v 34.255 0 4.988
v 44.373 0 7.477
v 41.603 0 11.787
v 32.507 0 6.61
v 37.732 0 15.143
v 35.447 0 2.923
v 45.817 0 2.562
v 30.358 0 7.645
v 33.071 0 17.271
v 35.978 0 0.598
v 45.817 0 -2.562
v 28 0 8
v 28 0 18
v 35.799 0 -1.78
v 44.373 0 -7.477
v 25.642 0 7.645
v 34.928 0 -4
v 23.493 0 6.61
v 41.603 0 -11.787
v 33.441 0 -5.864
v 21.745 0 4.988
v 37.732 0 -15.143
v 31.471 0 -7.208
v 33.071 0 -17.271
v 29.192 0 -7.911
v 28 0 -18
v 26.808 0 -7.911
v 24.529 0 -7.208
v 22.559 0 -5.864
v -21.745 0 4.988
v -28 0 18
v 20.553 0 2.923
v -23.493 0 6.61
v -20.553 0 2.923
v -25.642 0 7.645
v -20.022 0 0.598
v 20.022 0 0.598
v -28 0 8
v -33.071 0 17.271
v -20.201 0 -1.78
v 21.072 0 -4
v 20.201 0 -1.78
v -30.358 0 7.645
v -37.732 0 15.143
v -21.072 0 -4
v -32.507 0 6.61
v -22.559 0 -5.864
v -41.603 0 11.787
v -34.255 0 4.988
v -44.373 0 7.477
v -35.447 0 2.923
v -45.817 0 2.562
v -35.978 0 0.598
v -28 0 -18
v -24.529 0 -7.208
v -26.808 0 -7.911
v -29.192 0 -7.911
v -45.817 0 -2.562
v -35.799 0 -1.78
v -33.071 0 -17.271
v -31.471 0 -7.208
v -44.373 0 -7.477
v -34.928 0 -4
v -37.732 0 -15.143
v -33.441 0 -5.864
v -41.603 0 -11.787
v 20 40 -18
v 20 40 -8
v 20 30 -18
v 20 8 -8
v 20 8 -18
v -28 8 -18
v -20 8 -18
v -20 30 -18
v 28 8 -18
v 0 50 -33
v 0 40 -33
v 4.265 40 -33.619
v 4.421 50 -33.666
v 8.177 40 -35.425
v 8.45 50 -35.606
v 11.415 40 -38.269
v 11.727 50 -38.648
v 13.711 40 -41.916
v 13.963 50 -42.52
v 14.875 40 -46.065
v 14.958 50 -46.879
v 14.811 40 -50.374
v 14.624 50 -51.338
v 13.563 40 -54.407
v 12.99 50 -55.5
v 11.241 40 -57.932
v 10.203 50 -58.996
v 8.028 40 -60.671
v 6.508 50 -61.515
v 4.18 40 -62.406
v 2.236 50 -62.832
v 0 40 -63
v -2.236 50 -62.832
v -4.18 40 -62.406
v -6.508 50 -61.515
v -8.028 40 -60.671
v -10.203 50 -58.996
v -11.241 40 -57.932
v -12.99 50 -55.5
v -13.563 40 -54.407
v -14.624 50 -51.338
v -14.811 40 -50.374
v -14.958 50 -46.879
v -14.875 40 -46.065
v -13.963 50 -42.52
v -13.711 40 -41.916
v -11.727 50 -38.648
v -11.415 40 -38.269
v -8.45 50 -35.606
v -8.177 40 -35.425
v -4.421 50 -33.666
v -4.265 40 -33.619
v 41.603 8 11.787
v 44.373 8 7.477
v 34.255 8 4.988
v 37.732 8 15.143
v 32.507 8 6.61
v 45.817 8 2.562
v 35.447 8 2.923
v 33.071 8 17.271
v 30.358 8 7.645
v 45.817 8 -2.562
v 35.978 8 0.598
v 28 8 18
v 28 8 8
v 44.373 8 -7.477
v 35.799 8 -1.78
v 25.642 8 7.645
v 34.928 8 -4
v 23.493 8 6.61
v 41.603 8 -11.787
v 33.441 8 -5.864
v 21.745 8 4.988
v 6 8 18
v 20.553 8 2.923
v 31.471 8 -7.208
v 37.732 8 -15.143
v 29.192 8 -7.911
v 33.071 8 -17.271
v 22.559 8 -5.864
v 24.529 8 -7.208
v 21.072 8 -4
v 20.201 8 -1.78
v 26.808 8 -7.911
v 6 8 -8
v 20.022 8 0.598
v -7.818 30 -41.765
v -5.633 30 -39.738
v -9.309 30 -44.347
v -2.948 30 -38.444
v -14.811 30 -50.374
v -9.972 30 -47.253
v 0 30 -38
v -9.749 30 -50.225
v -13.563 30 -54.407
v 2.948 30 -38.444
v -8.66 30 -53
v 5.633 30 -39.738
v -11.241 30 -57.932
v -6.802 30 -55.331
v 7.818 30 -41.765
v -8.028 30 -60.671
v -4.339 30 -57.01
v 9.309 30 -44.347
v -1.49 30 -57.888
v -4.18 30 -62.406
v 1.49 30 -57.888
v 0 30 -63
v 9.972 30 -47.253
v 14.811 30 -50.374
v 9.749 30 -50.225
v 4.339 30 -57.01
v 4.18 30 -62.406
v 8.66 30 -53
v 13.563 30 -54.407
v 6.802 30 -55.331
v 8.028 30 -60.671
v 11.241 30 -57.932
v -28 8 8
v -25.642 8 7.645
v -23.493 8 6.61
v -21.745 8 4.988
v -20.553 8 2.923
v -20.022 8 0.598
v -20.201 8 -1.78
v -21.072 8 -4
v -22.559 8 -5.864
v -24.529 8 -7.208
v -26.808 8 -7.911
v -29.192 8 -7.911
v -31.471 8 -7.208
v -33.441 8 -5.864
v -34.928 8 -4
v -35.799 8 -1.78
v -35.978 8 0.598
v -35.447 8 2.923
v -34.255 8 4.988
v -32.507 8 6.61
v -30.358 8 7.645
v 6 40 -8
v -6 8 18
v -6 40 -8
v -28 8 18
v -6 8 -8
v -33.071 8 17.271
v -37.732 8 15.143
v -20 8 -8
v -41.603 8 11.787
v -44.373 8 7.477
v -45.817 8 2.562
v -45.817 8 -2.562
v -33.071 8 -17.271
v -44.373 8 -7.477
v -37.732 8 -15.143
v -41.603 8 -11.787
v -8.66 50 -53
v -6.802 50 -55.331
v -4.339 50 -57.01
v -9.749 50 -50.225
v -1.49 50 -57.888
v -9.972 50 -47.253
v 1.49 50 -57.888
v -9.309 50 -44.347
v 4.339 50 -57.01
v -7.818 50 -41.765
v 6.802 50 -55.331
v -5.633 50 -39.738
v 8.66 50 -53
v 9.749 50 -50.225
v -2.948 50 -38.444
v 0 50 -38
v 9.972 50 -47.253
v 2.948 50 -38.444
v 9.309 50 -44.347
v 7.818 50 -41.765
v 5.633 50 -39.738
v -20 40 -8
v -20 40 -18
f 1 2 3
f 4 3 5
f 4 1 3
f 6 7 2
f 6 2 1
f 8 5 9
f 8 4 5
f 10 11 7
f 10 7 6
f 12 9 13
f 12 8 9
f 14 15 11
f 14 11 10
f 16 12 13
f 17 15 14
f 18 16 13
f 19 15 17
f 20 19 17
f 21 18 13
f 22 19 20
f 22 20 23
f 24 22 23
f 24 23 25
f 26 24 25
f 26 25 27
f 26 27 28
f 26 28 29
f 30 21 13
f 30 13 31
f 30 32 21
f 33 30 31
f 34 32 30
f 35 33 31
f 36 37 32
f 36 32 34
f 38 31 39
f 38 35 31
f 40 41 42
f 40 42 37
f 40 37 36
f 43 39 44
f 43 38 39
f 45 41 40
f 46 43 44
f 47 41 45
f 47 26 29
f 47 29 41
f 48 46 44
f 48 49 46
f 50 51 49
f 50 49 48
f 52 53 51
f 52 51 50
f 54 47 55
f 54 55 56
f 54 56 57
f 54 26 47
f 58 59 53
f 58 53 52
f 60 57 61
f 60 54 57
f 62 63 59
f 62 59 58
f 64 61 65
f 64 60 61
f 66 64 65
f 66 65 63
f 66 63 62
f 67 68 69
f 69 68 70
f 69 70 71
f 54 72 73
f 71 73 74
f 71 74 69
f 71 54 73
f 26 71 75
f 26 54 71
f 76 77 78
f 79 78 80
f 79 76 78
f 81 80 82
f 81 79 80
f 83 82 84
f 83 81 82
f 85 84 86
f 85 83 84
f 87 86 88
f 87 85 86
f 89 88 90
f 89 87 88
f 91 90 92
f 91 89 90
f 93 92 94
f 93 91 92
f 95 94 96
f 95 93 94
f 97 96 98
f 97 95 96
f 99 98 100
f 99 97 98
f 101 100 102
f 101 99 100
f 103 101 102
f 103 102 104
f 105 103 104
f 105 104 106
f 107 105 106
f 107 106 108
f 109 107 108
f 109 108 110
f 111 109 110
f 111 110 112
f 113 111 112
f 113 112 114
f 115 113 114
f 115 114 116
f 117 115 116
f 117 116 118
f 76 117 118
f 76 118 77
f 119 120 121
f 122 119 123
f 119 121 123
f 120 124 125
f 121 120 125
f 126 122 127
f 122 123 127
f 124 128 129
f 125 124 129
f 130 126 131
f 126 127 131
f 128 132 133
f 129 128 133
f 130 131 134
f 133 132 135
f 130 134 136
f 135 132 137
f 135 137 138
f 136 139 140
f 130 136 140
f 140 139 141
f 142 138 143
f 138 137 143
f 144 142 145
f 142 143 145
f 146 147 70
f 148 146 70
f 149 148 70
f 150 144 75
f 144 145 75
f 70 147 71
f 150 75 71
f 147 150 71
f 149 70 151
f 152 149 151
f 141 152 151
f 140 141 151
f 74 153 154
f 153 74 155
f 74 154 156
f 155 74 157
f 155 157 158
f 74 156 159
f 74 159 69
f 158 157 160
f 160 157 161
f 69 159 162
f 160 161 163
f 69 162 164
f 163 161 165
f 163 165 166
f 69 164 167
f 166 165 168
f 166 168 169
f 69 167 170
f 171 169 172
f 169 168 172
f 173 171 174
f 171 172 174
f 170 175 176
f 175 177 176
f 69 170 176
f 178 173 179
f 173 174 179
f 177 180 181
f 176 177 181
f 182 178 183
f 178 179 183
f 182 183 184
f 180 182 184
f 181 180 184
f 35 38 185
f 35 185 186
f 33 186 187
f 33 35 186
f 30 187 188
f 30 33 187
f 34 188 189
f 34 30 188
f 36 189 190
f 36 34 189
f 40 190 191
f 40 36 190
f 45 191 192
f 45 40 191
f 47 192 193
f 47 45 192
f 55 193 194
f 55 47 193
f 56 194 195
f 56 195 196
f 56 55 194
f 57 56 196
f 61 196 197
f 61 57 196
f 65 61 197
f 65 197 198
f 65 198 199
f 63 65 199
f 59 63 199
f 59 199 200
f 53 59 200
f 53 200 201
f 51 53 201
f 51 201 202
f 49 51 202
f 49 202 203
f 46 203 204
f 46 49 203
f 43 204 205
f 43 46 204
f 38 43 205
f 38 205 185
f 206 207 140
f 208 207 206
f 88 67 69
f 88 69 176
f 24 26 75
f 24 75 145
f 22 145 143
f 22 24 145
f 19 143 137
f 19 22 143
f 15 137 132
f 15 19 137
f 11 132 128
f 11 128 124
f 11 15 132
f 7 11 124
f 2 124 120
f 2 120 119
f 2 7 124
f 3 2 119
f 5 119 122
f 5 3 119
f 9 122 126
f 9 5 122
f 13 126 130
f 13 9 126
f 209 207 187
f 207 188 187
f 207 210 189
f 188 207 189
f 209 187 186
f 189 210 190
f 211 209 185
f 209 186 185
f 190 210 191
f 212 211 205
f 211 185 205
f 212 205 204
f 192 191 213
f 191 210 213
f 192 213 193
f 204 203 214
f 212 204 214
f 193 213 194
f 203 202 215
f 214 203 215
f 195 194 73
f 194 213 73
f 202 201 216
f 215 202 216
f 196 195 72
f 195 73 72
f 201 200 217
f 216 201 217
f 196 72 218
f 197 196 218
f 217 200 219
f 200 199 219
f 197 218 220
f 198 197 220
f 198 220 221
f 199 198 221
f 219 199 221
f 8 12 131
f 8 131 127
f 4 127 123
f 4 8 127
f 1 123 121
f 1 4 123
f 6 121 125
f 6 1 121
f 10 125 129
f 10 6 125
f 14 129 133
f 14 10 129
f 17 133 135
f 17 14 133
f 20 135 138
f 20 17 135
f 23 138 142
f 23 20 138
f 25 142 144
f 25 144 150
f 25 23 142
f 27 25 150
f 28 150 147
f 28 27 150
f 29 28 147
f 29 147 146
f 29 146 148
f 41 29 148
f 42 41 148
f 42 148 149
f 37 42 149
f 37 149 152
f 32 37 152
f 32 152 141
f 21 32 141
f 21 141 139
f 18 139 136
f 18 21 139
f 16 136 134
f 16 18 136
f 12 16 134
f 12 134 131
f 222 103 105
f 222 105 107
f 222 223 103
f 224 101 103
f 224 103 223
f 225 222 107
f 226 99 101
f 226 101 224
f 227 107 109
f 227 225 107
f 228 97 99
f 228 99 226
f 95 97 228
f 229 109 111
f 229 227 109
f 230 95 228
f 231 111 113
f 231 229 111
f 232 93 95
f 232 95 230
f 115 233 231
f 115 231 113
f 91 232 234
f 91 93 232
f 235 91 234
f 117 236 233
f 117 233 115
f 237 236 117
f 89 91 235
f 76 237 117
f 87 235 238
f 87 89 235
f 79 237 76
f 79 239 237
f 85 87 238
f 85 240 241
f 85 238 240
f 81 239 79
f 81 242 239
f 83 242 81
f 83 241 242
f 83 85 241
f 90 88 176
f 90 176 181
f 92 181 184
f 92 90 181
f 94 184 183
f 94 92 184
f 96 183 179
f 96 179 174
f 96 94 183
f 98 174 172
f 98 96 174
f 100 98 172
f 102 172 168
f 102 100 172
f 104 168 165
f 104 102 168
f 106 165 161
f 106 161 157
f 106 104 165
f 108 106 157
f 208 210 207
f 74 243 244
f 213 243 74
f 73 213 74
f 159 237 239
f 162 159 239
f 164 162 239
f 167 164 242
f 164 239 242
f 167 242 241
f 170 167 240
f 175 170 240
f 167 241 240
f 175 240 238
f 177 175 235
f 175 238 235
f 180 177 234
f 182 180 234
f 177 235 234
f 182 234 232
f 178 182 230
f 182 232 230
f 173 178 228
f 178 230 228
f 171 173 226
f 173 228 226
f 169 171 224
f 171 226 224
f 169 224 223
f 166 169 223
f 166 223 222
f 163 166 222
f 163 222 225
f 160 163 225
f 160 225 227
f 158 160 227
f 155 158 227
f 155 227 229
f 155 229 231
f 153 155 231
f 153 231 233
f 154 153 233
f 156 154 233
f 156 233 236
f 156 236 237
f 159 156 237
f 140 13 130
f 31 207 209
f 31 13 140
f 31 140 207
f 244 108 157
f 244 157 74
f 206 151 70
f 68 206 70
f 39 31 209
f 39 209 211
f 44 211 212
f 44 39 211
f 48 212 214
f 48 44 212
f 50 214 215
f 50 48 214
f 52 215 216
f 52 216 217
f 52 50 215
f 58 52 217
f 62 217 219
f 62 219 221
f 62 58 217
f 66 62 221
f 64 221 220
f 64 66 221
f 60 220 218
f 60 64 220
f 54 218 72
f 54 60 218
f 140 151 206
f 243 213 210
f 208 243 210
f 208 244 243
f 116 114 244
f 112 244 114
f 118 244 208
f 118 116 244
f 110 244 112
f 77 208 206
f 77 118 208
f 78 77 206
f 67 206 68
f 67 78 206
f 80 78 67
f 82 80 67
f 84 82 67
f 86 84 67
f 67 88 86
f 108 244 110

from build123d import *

# Parameters (mm, degrees)
SKETCH2_R                = 8
BOSS_EXTRUDE1_DEPTH      = 8
SKETCH4_W                = 40
SKETCH4_H                = 10
BOSS_EXTRUDE2_DEPTH      = 32
BOSS_EXTRUDE3_DEPTH      = 6
BOSS_EXTRUDE3_DEPTH_BACK = 6
SKETCH7_R                = 10
BOSS_EXTRUDE4_DEPTH      = 10
BOSS_EXTRUDE5_START      = 10
SKETCH8_R                = 15
SKETCH8_R_2              = 10
BOSS_EXTRUDE5_DEPTH      = 10


with BuildPart() as part:
    # Sketch2 → Boss-Extrude1 (new body)
    with BuildSketch(Plane(origin=(0, 0, 0), x_dir=(1, 0, 0), z_dir=(0, 1, 0))):
        with BuildLine():
            Line((-28, 18), (28, 18))
            ThreePointArc((28, 18), (46, 0), (28, -18))
            Line((28, -18), (-28, -18))
            ThreePointArc((-28, -18), (-46, 0), (-28, 18))
        make_face()
        with Locations(Location((-28, 0, 0), (0, 0, 270))):
            Circle(SKETCH2_R, mode=Mode.SUBTRACT)
        with Locations(Location((28, 0, 0), (0, 0, 270))):
            Circle(SKETCH2_R, mode=Mode.SUBTRACT)
    extrude(amount=BOSS_EXTRUDE1_DEPTH)

    # Sketch4 → Boss-Extrude2 (add)
    with BuildSketch(Plane(origin=(0, 8, 0), x_dir=(1, 0, 0), z_dir=(0, 1, 0))):
        with Locations((0, 13)):
            Rectangle(SKETCH4_W, SKETCH4_H)
    extrude(amount=BOSS_EXTRUDE2_DEPTH)

    # Sketch5 → Boss-Extrude3 (add, two sides: drawn at the far end of the back side and taken through both)
    with BuildSketch(Plane(origin=(0, 0, 0), x_dir=(0, 0, -1), z_dir=(1, 0, 0)).offset(-BOSS_EXTRUDE3_DEPTH_BACK)):
        Polygon((8, 40), (8, 8), (-18, 8), align=None)
    extrude(amount=BOSS_EXTRUDE3_DEPTH + BOSS_EXTRUDE3_DEPTH_BACK)

    # Sketch7 → Boss-Extrude4 (add)
    with BuildSketch(Plane(origin=(0, 40, 0), x_dir=(1, 0, 0), z_dir=(0, 1, 0))):
        with BuildLine():
            Line((20, 18), (14.810951292, 50.373967528))
            ThreePointArc((14.810951292, 50.373967528), (0, 63), (-14.810951292, 50.373967528))
            Line((-14.810951292, 50.373967528), (-20, 18))
            Line((-20, 18), (20, 18))
        make_face()
        with Locations(Location((0, 48, 0), (0, 0, 270))):
            Circle(SKETCH7_R, mode=Mode.SUBTRACT)
    extrude(amount=-BOSS_EXTRUDE4_DEPTH)

    # Sketch8 → Boss-Extrude5 (add)
    with BuildSketch(Plane(origin=(0, 40, 0), x_dir=(1, 0, 0), z_dir=(0, 1, 0)).offset(BOSS_EXTRUDE5_START)):
        with Locations(Location((0, 48, 0), (0, 0, 270))):
            Circle(SKETCH8_R)
        with Locations(Location((0, 48, 0), (0, 0, 270))):
            Circle(SKETCH8_R_2, mode=Mode.SUBTRACT)
    extrude(amount=-BOSS_EXTRUDE5_DEPTH)


solid = part.part
